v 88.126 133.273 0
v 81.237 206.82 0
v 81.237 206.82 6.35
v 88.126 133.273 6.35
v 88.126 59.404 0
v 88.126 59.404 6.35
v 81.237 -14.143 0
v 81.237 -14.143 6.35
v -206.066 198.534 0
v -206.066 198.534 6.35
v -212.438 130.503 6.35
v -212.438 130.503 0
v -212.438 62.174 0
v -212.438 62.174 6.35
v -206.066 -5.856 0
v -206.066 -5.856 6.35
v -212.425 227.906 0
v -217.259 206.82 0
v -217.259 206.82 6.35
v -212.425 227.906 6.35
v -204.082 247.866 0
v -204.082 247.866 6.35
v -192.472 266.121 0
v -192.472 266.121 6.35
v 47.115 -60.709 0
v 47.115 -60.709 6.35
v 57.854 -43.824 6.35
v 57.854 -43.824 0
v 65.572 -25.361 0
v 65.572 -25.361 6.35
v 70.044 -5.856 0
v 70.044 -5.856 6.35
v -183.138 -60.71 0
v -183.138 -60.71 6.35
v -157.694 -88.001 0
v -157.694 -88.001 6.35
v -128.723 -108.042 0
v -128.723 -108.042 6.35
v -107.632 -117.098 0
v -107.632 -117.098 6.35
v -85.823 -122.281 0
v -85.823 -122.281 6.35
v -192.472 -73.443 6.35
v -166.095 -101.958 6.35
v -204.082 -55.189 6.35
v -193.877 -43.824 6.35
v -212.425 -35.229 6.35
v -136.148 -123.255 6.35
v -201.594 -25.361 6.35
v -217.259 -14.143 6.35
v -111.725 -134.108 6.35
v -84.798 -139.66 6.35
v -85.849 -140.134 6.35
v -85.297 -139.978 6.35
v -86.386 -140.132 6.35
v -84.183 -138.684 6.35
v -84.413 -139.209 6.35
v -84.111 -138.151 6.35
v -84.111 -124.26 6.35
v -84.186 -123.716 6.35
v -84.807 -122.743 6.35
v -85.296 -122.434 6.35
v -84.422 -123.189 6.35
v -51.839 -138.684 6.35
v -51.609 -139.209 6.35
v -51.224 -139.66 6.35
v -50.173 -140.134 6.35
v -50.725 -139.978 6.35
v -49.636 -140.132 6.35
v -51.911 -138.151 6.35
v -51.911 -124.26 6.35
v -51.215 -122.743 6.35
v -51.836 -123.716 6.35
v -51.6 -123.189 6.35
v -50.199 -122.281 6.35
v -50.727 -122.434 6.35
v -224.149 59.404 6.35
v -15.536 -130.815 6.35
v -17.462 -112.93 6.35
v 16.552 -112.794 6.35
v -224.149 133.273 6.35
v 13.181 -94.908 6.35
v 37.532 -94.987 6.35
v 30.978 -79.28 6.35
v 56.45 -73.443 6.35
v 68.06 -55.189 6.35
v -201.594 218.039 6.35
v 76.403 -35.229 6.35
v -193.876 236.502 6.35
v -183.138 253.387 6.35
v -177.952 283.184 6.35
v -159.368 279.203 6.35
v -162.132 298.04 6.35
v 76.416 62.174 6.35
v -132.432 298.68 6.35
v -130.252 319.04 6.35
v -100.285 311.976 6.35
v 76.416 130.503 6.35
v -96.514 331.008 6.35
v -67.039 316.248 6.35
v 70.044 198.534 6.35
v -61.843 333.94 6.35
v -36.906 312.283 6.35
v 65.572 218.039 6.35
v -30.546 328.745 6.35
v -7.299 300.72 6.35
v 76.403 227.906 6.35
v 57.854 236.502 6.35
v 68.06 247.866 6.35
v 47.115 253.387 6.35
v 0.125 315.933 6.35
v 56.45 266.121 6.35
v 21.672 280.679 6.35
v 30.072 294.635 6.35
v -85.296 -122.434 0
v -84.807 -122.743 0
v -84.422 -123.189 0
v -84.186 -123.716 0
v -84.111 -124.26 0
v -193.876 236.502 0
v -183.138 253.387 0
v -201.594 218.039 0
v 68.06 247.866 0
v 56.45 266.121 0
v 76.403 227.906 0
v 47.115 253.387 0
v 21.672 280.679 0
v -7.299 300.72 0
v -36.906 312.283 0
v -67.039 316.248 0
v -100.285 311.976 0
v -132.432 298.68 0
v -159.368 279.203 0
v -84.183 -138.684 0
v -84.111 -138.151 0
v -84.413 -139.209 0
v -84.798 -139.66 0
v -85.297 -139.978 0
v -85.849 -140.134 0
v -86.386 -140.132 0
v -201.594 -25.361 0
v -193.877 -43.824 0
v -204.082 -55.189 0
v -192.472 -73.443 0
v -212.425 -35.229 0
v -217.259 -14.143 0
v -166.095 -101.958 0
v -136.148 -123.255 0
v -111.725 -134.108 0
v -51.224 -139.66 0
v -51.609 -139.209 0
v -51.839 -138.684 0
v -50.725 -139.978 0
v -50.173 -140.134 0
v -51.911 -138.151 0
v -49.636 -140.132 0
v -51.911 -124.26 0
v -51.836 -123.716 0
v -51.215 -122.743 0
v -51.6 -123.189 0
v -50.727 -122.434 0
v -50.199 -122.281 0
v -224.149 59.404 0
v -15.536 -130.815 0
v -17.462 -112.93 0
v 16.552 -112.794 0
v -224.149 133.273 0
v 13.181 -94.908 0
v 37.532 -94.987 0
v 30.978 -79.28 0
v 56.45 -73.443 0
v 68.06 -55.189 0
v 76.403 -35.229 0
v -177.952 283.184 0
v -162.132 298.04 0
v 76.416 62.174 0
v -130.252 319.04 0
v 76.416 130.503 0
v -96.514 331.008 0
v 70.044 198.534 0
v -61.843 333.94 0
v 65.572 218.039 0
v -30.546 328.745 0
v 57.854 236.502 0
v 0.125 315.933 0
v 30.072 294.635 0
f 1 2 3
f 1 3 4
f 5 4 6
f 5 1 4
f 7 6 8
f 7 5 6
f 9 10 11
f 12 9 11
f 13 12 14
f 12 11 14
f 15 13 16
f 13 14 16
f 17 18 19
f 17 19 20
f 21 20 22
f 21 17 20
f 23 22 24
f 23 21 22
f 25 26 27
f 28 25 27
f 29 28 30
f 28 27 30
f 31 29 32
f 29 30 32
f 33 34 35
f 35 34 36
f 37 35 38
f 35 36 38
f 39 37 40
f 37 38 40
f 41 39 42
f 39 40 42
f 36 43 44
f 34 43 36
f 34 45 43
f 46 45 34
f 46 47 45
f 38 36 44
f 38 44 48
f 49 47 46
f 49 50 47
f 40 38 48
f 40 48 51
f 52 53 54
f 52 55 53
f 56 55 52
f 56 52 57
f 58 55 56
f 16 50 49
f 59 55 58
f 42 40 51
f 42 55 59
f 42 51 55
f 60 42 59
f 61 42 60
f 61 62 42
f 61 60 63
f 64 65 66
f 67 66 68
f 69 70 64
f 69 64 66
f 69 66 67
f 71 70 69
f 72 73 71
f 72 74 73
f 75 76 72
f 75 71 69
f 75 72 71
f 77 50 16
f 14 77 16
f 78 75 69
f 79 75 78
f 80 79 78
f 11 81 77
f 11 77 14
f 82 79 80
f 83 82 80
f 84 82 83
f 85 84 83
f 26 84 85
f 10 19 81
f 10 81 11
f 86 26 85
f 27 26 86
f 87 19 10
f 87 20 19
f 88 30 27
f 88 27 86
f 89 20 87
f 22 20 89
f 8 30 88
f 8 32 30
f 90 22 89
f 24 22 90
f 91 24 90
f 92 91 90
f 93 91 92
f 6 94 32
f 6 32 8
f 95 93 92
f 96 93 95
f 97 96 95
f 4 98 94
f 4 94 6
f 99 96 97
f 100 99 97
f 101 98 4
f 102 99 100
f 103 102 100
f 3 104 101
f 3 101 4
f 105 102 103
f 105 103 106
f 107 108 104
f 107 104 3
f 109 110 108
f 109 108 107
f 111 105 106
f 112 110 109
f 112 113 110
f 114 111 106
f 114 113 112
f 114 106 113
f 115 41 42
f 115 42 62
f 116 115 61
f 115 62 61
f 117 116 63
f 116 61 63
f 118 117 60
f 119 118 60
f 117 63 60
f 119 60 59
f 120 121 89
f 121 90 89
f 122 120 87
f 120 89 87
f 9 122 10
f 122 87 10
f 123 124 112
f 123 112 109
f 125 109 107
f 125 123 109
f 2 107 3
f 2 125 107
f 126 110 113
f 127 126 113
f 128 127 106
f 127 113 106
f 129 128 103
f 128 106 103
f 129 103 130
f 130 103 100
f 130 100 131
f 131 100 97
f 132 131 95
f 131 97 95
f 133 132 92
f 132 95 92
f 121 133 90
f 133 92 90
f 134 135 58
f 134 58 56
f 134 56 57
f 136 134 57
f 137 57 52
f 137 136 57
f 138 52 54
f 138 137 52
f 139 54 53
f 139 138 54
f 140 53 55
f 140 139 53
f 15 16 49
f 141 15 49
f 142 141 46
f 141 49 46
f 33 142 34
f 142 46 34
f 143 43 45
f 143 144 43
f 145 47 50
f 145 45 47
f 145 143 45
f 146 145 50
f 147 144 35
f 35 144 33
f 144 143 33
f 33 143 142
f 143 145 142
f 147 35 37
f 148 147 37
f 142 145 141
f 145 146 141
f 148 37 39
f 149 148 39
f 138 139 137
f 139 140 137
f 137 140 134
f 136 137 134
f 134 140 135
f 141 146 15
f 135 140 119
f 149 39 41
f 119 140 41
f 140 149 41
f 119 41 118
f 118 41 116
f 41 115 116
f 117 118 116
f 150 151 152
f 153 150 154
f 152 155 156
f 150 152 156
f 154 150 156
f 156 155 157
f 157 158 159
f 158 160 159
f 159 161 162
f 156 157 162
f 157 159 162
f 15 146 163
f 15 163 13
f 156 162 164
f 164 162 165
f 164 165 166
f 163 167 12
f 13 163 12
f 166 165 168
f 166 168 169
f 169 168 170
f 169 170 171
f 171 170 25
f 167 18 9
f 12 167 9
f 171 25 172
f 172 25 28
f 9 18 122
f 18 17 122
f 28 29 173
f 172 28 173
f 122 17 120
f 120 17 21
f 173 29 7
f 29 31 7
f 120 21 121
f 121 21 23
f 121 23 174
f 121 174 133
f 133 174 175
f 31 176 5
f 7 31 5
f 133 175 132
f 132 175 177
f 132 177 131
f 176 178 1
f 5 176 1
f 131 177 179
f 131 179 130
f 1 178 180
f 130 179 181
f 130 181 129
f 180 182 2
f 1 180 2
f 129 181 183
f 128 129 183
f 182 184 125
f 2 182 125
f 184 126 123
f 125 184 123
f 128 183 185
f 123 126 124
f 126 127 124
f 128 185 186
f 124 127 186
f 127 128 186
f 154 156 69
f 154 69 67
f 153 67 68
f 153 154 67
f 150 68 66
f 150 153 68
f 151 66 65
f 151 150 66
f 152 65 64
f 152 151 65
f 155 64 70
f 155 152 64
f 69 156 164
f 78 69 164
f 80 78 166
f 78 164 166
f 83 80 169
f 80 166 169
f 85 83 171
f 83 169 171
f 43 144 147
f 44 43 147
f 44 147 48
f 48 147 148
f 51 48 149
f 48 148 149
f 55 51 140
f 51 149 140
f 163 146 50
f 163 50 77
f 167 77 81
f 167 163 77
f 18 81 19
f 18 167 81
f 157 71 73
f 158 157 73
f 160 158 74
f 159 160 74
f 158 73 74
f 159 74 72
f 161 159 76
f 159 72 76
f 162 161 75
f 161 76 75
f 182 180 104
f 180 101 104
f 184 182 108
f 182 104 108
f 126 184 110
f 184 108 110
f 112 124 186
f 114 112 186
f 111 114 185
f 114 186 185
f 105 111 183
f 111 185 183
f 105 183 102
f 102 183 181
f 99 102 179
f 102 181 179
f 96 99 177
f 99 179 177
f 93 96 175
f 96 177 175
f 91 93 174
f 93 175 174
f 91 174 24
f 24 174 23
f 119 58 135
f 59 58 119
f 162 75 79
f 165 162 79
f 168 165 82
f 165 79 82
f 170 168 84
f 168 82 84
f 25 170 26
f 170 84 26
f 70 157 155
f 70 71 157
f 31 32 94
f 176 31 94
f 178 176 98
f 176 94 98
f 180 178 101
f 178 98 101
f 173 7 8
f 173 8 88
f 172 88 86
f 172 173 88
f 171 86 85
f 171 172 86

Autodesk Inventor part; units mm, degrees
ref_plane "YZ Plane" through (0, 0, 0) normal (1, 0, 0) x (0, 1, 0)
ref_plane "XZ Plane" through (0, 0, 0) normal (0, 1, 0) x (-1, 0, 0)
ref_plane "XY Plane" through (0, 0, 0) normal (0, 0, 1) x (1, 0, 0)
ref_plane "Work Plane2" through (0, 0, 0) normal (0, 0, 1) x (1, 0, 0)
sketch "Sketch1" plane through (0, 0, 0) normal (0, 0, 1) x (1, 0, 0)
  circle A0 centre (-192.358, 126.614) radius 1.75 projected
  arc A1 (81.2372, 206.8201) -> (56.4499, 266.1206) centre (-44.5185, 189.0856) ccw
  ellipse E0 centre (-68.0111, 96.3387) end of major axis (-68.0111, -141.4053) minor radius 177.8 (56.4499, 266.1206) -> (-192.4721, 266.1206) ccw
  arc A2 (-192.4721, 266.1206) -> (-217.2594, 206.8201) centre (-91.5037, 189.0856) ccw
  arc A3 (-217.2594, 206.8201) -> (-217.2594, -14.1426) centre (566.1677, 96.3387) ccw
  arc A4 (-217.2594, -14.1426) -> (-192.4721, -73.4431) centre (-91.5037, 3.5918) ccw
  ellipse E1 centre (-68.0111, 96.3387) end of major axis (-68.0111, -141.4053) minor radius 177.8 (-192.4721, -73.4431) -> (56.4499, -73.4431) ccw
  arc A5 (56.4499, -73.4431) -> (81.2372, -14.1426) centre (-44.5185, 3.5918) ccw
  arc A6 (81.2372, -14.1426) -> (81.2372, 206.8201) centre (-702.1899, 96.3387) ccw
extrude "Extrusion1" add sketch "Sketch1" along normal blind 6.35 contours A0 | A6 A5 E1 A4 A3 A2 E0 A1
sketch "Sketch2" plane through (0, 0, 6.35) normal (0, 0, 1) x (1, 0, 0)
  circle A0 centre (-183.032, 124.3433) radius 1.6187
  arc A1 (70.0436, 198.534) -> (47.1154, 253.3869) centre (-46.2804, 182.1296) ccw
  ellipse E0 centre (-68.0111, 96.3387) end of major axis (-68.0111, -123.5745) minor radius 164.465 (47.1154, 253.3869) -> (-183.1375, 253.3869) ccw
  arc A2 (-183.1375, 253.3869) -> (-206.0658, 198.534) centre (-89.7418, 182.1296) ccw
  arc A3 (-206.0658, 198.534) -> (-206.0658, -5.8565) centre (518.6043, 96.3387) ccw
  arc A4 (-206.0658, -5.8565) -> (-183.1375, -60.7095) centre (-89.7418, 10.5478) ccw
  ellipse E1 centre (-68.0111, 96.3387) end of major axis (-68.0111, -123.5745) minor radius 164.465 (-183.1375, -60.7095) -> (47.1154, -60.7095) ccw
  arc A5 (47.1154, -60.7095) -> (70.0436, -5.8565) centre (-46.2804, 10.5478) ccw
  arc A6 (70.0436, -5.8565) -> (70.0436, 198.534) centre (-654.6265, 96.3387) ccw
  point P0 (0, 0)
extrude "Extrusion2" cut sketch "Sketch2" against normal blind 6.35 contours A0 | A6 A5 E1 A4 A3 A2 E0 A1
sketch "Sketch3" plane through (0, 0, 6.35) normal (0, 0, 1) x (1, 0, 0)
  circle A0 centre (-196.3999, 49.2593) radius 1.75 projected
  circle A1 centre (-190.196, 38.5473) radius 1.75 projected
  circle A2 centre (-167.6724, 59.9713) radius 1.75 projected
  circle A3 centre (-167.6724, 38.5473) radius 1.75 projected
  circle A4 centre (-161.4685, 49.2593) radius 1.75 projected
  circle A5 centre (54.1738, 59.9713) radius 1.75 projected
  circle A6 centre (60.3777, 49.2593) radius 1.75 projected
  circle A7 centre (25.4463, 29.0473) radius 1.75 projected
  circle A8 centre (25.4463, 49.2593) radius 1.75 projected
  circle A9 centre (25.4463, 69.4713) radius 1.75 projected
  circle A10 centre (31.6502, 59.9713) radius 1.75 projected
  circle A11 centre (31.6502, 38.5473) radius 1.75 projected
  circle A12 centre (54.1738, 38.5473) radius 1.75 projected
  circle A13 centre (60.3777, 29.0473) radius 1.75 projected
  circle A14 centre (60.3777, 69.4713) radius 1.75 projected
  circle A15 centre (-161.4685, 29.0473) radius 1.75 projected
  circle A16 centre (-190.196, 59.9713) radius 1.75 projected
  circle A17 centre (-161.4685, 69.4713) radius 1.75 projected
  circle A18 centre (-196.3999, 29.0473) radius 1.75 projected
  circle A19 centre (-196.3999, 69.4713) radius 1.75 projected
  circle A20 centre (-192.358, 126.614) radius 1.75 projected
  circle A21 centre (-166.2135, 137.114) radius 1.75 projected
  circle A22 centre (-151.3535, 137.114) radius 1.75 projected
  circle A23 centre (56.3358, 169.2663) radius 1.75 projected
  circle A24 centre (30.1913, 137.114) radius 1.75 projected
  circle A25 centre (30.1913, 169.114) radius 1.75 projected
  circle A26 centre (15.3313, 169.114) radius 1.75 projected
  circle A27 centre (15.3313, 137.114) radius 1.75 projected
  circle A28 centre (56.3358, 126.614) radius 1.75 projected
  circle A29 centre (-166.2135, 169.114) radius 1.75 projected
  circle A30 centre (-192.358, 169.2663) radius 1.75 projected
  circle A31 centre (-151.3535, 169.114) radius 1.75 projected
  circle A32 centre (-125.2039, 71.3387) radius 1.75 projected
  circle A33 centre (-10.8188, 71.3387) radius 1.75 projected
  circle A34 centre (-125.2036, 96.9184) radius 1.75 projected
  circle A35 centre (-10.8185, 96.9184) radius 1.75 projected
  circle A36 centre (-10.8187, 86.9184) radius 1.75 projected
  circle A37 centre (-125.2035, 86.9184) radius 1.75 projected
  circle A38 centre (-10.8188, 61.3387) radius 1.75 projected
  circle A39 centre (-125.2039, 61.3387) radius 1.75 projected
  circle A40 centre (-68.6105, -28.321) radius 1.63 projected
  arc A41 (-88.5111, 275.0837) -> (-92.5111, 275.0837) centre (-90.5111, 275.0837) ccw projected
  line L0 (-88.5111, 275.0837) -> (-88.5111, 230.0837) projected
  arc A42 (-92.5111, 230.0837) -> (-88.5111, 230.0837) centre (-90.5111, 230.0837) ccw projected
  line L1 (-92.5111, 230.0837) -> (-92.5111, 275.0837) projected
  arc A43 (-43.5111, 275.0837) -> (-47.5111, 275.0837) centre (-45.5111, 275.0837) ccw projected
  line L2 (-43.5111, 275.0837) -> (-43.5111, 230.0837) projected
  arc A44 (-47.5111, 230.0837) -> (-43.5111, 230.0837) centre (-45.5111, 230.0837) ccw projected
  line L3 (-47.5111, 230.0837) -> (-47.5111, 275.0837) projected
  circle A45 centre (-6.132, -79.3472) radius 1.25 projected
  circle A46 centre (-145.3842, 185.8247) radius 1.5 projected
  circle A47 centre (-153.8932, -1.3222) radius 1.5 projected
  circle A48 centre (-145.3842, -79.3472) radius 1.5 projected
  circle A49 centre (-129.8902, 6.8528) radius 1.5 projected
  circle A50 centre (-116.3012, -71.1722) radius 1.5 projected
  circle A51 centre (-129.8902, 272.0247) radius 1.5 projected
  circle A52 centre (-129.8902, 185.8247) radius 1.5 projected
  circle A53 centre (-116.3012, 263.8497) radius 1.5 projected
  circle A54 centre (17.871, -71.1722) radius 1.5 projected
  circle A55 centre (-6.132, 6.8528) radius 1.5 projected
  circle A56 centre (-19.721, -1.3222) radius 1.5 projected
  circle A57 centre (17.871, 263.8497) radius 1.5 projected
  circle A58 centre (9.362, 272.0247) radius 1.5 projected
  circle A59 centre (9.362, 185.8247) radius 1.5 projected
  circle A60 centre (-19.721, 193.9997) radius 1.5 projected
  circle A61 centre (-19.721, 263.8497) radius 1.5 projected
  circle A62 centre (-6.132, 185.8247) radius 1.5 projected
  circle A63 centre (-6.132, 272.0247) radius 1.5 projected
  circle A64 centre (17.871, 193.9997) radius 1.5 projected
  circle A65 centre (-19.721, -71.1722) radius 1.5 projected
  circle A66 centre (9.362, -79.3472) radius 1.5 projected
  circle A67 centre (9.362, 6.8528) radius 1.5 projected
  circle A68 centre (17.871, -1.3222) radius 1.5 projected
  circle A69 centre (-116.3012, 193.9997) radius 1.5 projected
  circle A70 centre (-153.8932, 193.9997) radius 1.5 projected
  circle A71 centre (-153.8932, 263.8497) radius 1.5 projected
  circle A72 centre (-145.3842, 6.8528) radius 1.5 projected
  circle A73 centre (-129.8902, -79.3472) radius 1.5 projected
  circle A74 centre (-153.8932, -71.1722) radius 1.5 projected
  circle A75 centre (-116.3012, -1.3222) radius 1.5 projected
  circle A76 centre (-145.3842, 272.0247) radius 1.5 projected
  arc A77 (81.2372, 206.8201) -> (56.4499, 266.1206) centre (-44.5185, 189.0856) ccw projected
  ellipse E0 centre (-68.0111, 96.3387) end of major axis (-68.0111, -141.4053) minor radius 177.8 (56.4499, 266.1206) -> (-192.4721, 266.1206) ccw projected
  arc A78 (-192.4721, 266.1206) -> (-217.2594, 206.8201) centre (-91.5037, 189.0856) ccw projected
  arc A79 (-217.2594, 206.8201) -> (-217.2594, -14.1426) centre (566.1677, 96.3387) ccw projected
  arc A80 (-217.2594, -14.1426) -> (-192.4721, -73.4431) centre (-91.5037, 3.5918) ccw projected
  ellipse E1 centre (-68.0111, 96.3387) end of major axis (-68.0111, -141.4053) minor radius 177.8 (-192.4721, -73.4431) -> (56.4499, -73.4431) ccw projected
  arc A81 (56.4499, -73.4431) -> (81.2372, -14.1426) centre (-44.5185, 3.5918) ccw projected
  arc A82 (81.2372, -14.1426) -> (81.2372, 206.8201) centre (-702.1899, 96.3387) ccw projected
  circle A83 centre (-35.6216, 248.9087) radius 1.25 projected
  circle A84 centre (-100.4006, 318.7587) radius 1.25 projected
  circle A85 centre (-100.4006, 248.9087) radius 1.25 projected
  circle A86 centre (-35.6216, 318.7587) radius 1.25 projected
  circle A87 centre (-56.9111, -118.4053) radius 1.5 projected
  circle A88 centre (-79.1111, -118.4053) radius 1.5 projected
  circle A89 centre (-58.7361, -128.5803) radius 1.5 projected
  circle A90 centre (-61.0891, -46.904) radius 1.5 projected
  circle A91 centre (-53.9141, -54.079) radius 1.5 projected
  circle A92 centre (-92.2681, -54.079) radius 1.5 projected
  circle A93 centre (-85.0931, -46.904) radius 1.5 projected
  circle A94 centre (-77.2861, -128.5803) radius 1.5 projected
  circle A95 centre (-79.1111, -110.4053) radius 1.5 projected
  circle A96 centre (-56.9111, -110.4053) radius 1.5 projected
  line L4 (-82.971, -17.5241) -> (-82.971, 43.3967) projected
  line L5 (-82.971, 43.3967) -> (-52.491, 43.3967) projected
  line L6 (-52.491, 43.3967) -> (-52.491, -17.5241) projected
  line L7 (-52.491, -17.5241) -> (-82.971, -17.5241) projected
  circle A97 centre (-68.0111, 137.616) radius 35 projected
  line L8 (-123.7158, 171.3631) -> (-119.7158, 171.3631) projected
  arc A98 (-119.7158, 168.3632) -> (-119.7158, 171.3631) centre (-119.7158, 169.8631) ccw projected
  line L9 (-119.7158, 168.3632) -> (-123.7158, 168.3632) projected
  arc A99 (-123.7158, 171.3631) -> (-123.7158, 168.3632) centre (-123.7158, 169.8631) ccw projected
  line L10 (-123.6698, 106.6744) -> (-119.6698, 106.6744) projected
  arc A100 (-119.6698, 103.6746) -> (-119.6698, 106.6744) centre (-119.6698, 105.1745) ccw projected
  line L11 (-119.6698, 103.6746) -> (-123.6698, 103.6746) projected
  arc A101 (-123.6698, 106.6744) -> (-123.6698, 103.6746) centre (-123.6698, 105.1745) ccw projected
  line L12 (-9.1669, 171.4444) -> (-5.1669, 171.4444) projected
  arc A102 (-5.1669, 168.4446) -> (-5.1669, 171.4444) centre (-5.1669, 169.9445) ccw projected
  line L13 (-5.1669, 168.4446) -> (-9.1669, 168.4446) projected
  arc A103 (-9.1669, 171.4444) -> (-9.1669, 168.4446) centre (-9.1669, 169.9445) ccw projected
  line L14 (-5.1669, 103.6742) -> (-9.1669, 103.6742) projected
  arc A104 (-9.1669, 106.6741) -> (-9.1669, 103.6742) centre (-9.1669, 105.1742) ccw projected
  line L15 (-9.1669, 106.6741) -> (-5.1669, 106.6741) projected
  arc A105 (-5.1669, 103.6742) -> (-5.1669, 106.6741) centre (-5.1669, 105.1742) ccw projected
  arc A106 (-34.0816, 86.6493) -> (-37.0792, 86.6494) centre (-35.5804, 86.6492) ccw projected
  line L16 (-34.0816, 86.6493) -> (-34.0814, 82.6493) projected
  arc A107 (-37.0794, 82.6493) -> (-34.0814, 82.6493) centre (-35.5804, 82.6492) ccw projected
  line L17 (-37.0794, 82.6493) -> (-37.0792, 86.6494) projected
  arc A108 (-34.0865, 201.0395) -> (-37.0841, 201.0395) centre (-35.5853, 201.0395) ccw projected
  line L18 (-34.0865, 201.0395) -> (-34.0863, 197.0396) projected
  arc A109 (-37.0843, 197.0395) -> (-34.0863, 197.0396) centre (-35.5853, 197.0395) ccw projected
  line L19 (-37.0843, 197.0395) -> (-37.0841, 201.0395) projected
  arc A110 (-34.0812, 78.9993) -> (-37.0788, 78.9992) centre (-35.58, 78.9992) ccw projected
  line L20 (-34.0812, 78.9993) -> (-34.081, 74.9993) projected
  arc A111 (-37.079, 74.9993) -> (-34.081, 74.9993) centre (-35.58, 74.9992) ccw projected
  line L21 (-37.079, 74.9993) -> (-37.0788, 78.9992) projected
  arc A112 (-98.9325, 193.3865) -> (-101.9301, 193.3866) centre (-100.4313, 193.3865) ccw projected
  line L22 (-98.9325, 193.3865) -> (-98.9323, 189.3866) projected
  arc A113 (-101.9303, 189.3866) -> (-98.9323, 189.3866) centre (-100.4313, 189.3865) ccw projected
  line L23 (-101.9303, 189.3866) -> (-101.9301, 193.3866) projected
  circle A114 centre (-95.163, -4.4165) radius 1.25 projected
  circle A115 centre (-36.616, 37.0467) radius 1.25 projected
  circle A116 centre (-46.141, -14.3491) radius 1.25 projected
  circle A117 centre (-36.616, -11.1741) radius 1.25 projected
  circle A118 centre (-36.616, 12.9421) radius 1.25 projected
  circle A119 centre (-46.141, 40.2217) radius 1.25 projected
  circle A120 centre (-95.163, 40.4375) radius 1.25 projected
  arc A121 (-98.8512, 78.9533) -> (-101.8488, 78.9533) centre (-100.35, 78.9533) ccw projected
  line L24 (-98.8512, 78.9533) -> (-98.851, 74.9533) projected
  arc A122 (-101.849, 74.9533) -> (-98.851, 74.9533) centre (-100.35, 74.9533) ccw projected
  line L25 (-101.849, 74.9533) -> (-101.8488, 78.9533) projected
  line L26 (-34.0865, 193.3895) -> (-34.0863, 189.3896) projected
  arc A123 (-37.0843, 189.3896) -> (-34.0863, 189.3896) centre (-35.5853, 189.3895) ccw projected
  line L27 (-37.0843, 189.3896) -> (-37.0841, 193.3896) projected
  arc A124 (-34.0865, 193.3895) -> (-37.0841, 193.3896) centre (-35.5853, 193.3895) ccw projected
  arc A125 (-98.9379, 201.0395) -> (-101.9362, 200.9947) centre (-100.4367, 200.9934) ccw projected
  line L28 (-98.9379, 201.0395) -> (-98.9377, 196.9935) projected
  arc A126 (-101.9357, 196.9932) -> (-98.9377, 196.9935) centre (-100.4367, 196.9934) ccw projected
  line L29 (-101.9357, 196.9932) -> (-101.9362, 200.9947) projected
  arc A127 (-98.8567, 86.6032) -> (-101.8543, 86.6033) centre (-100.3555, 86.6032) ccw projected
  line L30 (-98.8567, 86.6032) -> (-98.8565, 82.6033) projected
  arc A128 (-101.8544, 82.6033) -> (-98.8565, 82.6033) centre (-100.3555, 82.6032) ccw projected
  line L31 (-101.8544, 82.6033) -> (-101.8543, 86.6033) projected
  line L32 (-16.8169, 106.6744) -> (-12.8169, 106.6744) projected
  arc A129 (-12.8169, 103.6746) -> (-12.8169, 106.6744) centre (-12.8169, 105.1745) ccw projected
  line L33 (-12.8169, 103.6746) -> (-16.8169, 103.6746) projected
  arc A130 (-16.8169, 106.6744) -> (-16.8169, 103.6746) centre (-16.8169, 105.1745) ccw projected
  line L34 (-16.8629, 171.439) -> (-12.8629, 171.439) projected
  arc A131 (-12.8629, 168.4391) -> (-12.8629, 171.439) centre (-12.8629, 169.9391) ccw projected
  line L35 (-12.8629, 168.4391) -> (-16.8629, 168.4391) projected
  arc A132 (-16.8629, 171.439) -> (-16.8629, 168.4391) centre (-16.8629, 169.9391) ccw projected
  line L36 (-131.3198, 106.6744) -> (-127.3198, 106.6744) projected
  arc A133 (-127.3198, 103.6746) -> (-127.3198, 106.6744) centre (-127.3198, 105.1745) ccw projected
  line L37 (-127.3198, 103.6746) -> (-131.3198, 103.6746) projected
  arc A134 (-131.3198, 106.6744) -> (-131.3198, 103.6746) centre (-131.3198, 105.1745) ccw projected
  line L38 (-131.3658, 171.3576) -> (-127.3658, 171.3576) projected
  arc A135 (-127.3658, 168.3578) -> (-127.3658, 171.3576) centre (-127.3658, 169.8577) ccw projected
  line L39 (-127.3658, 168.3578) -> (-131.3658, 168.3578) projected
  arc A136 (-131.3658, 171.3576) -> (-131.3658, 168.3578) centre (-131.3658, 169.8577) ccw projected
  line L40 (-84.1111, -106.4053) -> (-84.1111, -139.5398) projected
  line L41 (-51.9111, -139.5398) -> (-51.9111, -106.4053) projected
  line L42 (-84.1111, -122.3838) -> (-51.9111, -122.3838)
  line L43 (-51.9111, -122.3838) -> (-51.9111, -147.7518)
  line L44 (-51.9111, -147.7518) -> (-84.1111, -147.7518)
  line L45 (-84.1111, -147.7518) -> (-84.1111, -122.3838)
  point P0 (0, 0)
extrude "Extrusion3" cut sketch "Sketch3" against normal blind 6.35 contours L43 L44 L45 E1 | E1 L45 L40 L42 L41 L43 | A89 | A94
fillet "Fillet1" radius 2 4 edges at (-84.1111, -140.4286, 3.175) (-51.9111, -140.4286, 3.175) (-84.1111, -122.5182, 3.175) (-51.9111, -122.5182, 3.175)
properties part number "FrameRim"
